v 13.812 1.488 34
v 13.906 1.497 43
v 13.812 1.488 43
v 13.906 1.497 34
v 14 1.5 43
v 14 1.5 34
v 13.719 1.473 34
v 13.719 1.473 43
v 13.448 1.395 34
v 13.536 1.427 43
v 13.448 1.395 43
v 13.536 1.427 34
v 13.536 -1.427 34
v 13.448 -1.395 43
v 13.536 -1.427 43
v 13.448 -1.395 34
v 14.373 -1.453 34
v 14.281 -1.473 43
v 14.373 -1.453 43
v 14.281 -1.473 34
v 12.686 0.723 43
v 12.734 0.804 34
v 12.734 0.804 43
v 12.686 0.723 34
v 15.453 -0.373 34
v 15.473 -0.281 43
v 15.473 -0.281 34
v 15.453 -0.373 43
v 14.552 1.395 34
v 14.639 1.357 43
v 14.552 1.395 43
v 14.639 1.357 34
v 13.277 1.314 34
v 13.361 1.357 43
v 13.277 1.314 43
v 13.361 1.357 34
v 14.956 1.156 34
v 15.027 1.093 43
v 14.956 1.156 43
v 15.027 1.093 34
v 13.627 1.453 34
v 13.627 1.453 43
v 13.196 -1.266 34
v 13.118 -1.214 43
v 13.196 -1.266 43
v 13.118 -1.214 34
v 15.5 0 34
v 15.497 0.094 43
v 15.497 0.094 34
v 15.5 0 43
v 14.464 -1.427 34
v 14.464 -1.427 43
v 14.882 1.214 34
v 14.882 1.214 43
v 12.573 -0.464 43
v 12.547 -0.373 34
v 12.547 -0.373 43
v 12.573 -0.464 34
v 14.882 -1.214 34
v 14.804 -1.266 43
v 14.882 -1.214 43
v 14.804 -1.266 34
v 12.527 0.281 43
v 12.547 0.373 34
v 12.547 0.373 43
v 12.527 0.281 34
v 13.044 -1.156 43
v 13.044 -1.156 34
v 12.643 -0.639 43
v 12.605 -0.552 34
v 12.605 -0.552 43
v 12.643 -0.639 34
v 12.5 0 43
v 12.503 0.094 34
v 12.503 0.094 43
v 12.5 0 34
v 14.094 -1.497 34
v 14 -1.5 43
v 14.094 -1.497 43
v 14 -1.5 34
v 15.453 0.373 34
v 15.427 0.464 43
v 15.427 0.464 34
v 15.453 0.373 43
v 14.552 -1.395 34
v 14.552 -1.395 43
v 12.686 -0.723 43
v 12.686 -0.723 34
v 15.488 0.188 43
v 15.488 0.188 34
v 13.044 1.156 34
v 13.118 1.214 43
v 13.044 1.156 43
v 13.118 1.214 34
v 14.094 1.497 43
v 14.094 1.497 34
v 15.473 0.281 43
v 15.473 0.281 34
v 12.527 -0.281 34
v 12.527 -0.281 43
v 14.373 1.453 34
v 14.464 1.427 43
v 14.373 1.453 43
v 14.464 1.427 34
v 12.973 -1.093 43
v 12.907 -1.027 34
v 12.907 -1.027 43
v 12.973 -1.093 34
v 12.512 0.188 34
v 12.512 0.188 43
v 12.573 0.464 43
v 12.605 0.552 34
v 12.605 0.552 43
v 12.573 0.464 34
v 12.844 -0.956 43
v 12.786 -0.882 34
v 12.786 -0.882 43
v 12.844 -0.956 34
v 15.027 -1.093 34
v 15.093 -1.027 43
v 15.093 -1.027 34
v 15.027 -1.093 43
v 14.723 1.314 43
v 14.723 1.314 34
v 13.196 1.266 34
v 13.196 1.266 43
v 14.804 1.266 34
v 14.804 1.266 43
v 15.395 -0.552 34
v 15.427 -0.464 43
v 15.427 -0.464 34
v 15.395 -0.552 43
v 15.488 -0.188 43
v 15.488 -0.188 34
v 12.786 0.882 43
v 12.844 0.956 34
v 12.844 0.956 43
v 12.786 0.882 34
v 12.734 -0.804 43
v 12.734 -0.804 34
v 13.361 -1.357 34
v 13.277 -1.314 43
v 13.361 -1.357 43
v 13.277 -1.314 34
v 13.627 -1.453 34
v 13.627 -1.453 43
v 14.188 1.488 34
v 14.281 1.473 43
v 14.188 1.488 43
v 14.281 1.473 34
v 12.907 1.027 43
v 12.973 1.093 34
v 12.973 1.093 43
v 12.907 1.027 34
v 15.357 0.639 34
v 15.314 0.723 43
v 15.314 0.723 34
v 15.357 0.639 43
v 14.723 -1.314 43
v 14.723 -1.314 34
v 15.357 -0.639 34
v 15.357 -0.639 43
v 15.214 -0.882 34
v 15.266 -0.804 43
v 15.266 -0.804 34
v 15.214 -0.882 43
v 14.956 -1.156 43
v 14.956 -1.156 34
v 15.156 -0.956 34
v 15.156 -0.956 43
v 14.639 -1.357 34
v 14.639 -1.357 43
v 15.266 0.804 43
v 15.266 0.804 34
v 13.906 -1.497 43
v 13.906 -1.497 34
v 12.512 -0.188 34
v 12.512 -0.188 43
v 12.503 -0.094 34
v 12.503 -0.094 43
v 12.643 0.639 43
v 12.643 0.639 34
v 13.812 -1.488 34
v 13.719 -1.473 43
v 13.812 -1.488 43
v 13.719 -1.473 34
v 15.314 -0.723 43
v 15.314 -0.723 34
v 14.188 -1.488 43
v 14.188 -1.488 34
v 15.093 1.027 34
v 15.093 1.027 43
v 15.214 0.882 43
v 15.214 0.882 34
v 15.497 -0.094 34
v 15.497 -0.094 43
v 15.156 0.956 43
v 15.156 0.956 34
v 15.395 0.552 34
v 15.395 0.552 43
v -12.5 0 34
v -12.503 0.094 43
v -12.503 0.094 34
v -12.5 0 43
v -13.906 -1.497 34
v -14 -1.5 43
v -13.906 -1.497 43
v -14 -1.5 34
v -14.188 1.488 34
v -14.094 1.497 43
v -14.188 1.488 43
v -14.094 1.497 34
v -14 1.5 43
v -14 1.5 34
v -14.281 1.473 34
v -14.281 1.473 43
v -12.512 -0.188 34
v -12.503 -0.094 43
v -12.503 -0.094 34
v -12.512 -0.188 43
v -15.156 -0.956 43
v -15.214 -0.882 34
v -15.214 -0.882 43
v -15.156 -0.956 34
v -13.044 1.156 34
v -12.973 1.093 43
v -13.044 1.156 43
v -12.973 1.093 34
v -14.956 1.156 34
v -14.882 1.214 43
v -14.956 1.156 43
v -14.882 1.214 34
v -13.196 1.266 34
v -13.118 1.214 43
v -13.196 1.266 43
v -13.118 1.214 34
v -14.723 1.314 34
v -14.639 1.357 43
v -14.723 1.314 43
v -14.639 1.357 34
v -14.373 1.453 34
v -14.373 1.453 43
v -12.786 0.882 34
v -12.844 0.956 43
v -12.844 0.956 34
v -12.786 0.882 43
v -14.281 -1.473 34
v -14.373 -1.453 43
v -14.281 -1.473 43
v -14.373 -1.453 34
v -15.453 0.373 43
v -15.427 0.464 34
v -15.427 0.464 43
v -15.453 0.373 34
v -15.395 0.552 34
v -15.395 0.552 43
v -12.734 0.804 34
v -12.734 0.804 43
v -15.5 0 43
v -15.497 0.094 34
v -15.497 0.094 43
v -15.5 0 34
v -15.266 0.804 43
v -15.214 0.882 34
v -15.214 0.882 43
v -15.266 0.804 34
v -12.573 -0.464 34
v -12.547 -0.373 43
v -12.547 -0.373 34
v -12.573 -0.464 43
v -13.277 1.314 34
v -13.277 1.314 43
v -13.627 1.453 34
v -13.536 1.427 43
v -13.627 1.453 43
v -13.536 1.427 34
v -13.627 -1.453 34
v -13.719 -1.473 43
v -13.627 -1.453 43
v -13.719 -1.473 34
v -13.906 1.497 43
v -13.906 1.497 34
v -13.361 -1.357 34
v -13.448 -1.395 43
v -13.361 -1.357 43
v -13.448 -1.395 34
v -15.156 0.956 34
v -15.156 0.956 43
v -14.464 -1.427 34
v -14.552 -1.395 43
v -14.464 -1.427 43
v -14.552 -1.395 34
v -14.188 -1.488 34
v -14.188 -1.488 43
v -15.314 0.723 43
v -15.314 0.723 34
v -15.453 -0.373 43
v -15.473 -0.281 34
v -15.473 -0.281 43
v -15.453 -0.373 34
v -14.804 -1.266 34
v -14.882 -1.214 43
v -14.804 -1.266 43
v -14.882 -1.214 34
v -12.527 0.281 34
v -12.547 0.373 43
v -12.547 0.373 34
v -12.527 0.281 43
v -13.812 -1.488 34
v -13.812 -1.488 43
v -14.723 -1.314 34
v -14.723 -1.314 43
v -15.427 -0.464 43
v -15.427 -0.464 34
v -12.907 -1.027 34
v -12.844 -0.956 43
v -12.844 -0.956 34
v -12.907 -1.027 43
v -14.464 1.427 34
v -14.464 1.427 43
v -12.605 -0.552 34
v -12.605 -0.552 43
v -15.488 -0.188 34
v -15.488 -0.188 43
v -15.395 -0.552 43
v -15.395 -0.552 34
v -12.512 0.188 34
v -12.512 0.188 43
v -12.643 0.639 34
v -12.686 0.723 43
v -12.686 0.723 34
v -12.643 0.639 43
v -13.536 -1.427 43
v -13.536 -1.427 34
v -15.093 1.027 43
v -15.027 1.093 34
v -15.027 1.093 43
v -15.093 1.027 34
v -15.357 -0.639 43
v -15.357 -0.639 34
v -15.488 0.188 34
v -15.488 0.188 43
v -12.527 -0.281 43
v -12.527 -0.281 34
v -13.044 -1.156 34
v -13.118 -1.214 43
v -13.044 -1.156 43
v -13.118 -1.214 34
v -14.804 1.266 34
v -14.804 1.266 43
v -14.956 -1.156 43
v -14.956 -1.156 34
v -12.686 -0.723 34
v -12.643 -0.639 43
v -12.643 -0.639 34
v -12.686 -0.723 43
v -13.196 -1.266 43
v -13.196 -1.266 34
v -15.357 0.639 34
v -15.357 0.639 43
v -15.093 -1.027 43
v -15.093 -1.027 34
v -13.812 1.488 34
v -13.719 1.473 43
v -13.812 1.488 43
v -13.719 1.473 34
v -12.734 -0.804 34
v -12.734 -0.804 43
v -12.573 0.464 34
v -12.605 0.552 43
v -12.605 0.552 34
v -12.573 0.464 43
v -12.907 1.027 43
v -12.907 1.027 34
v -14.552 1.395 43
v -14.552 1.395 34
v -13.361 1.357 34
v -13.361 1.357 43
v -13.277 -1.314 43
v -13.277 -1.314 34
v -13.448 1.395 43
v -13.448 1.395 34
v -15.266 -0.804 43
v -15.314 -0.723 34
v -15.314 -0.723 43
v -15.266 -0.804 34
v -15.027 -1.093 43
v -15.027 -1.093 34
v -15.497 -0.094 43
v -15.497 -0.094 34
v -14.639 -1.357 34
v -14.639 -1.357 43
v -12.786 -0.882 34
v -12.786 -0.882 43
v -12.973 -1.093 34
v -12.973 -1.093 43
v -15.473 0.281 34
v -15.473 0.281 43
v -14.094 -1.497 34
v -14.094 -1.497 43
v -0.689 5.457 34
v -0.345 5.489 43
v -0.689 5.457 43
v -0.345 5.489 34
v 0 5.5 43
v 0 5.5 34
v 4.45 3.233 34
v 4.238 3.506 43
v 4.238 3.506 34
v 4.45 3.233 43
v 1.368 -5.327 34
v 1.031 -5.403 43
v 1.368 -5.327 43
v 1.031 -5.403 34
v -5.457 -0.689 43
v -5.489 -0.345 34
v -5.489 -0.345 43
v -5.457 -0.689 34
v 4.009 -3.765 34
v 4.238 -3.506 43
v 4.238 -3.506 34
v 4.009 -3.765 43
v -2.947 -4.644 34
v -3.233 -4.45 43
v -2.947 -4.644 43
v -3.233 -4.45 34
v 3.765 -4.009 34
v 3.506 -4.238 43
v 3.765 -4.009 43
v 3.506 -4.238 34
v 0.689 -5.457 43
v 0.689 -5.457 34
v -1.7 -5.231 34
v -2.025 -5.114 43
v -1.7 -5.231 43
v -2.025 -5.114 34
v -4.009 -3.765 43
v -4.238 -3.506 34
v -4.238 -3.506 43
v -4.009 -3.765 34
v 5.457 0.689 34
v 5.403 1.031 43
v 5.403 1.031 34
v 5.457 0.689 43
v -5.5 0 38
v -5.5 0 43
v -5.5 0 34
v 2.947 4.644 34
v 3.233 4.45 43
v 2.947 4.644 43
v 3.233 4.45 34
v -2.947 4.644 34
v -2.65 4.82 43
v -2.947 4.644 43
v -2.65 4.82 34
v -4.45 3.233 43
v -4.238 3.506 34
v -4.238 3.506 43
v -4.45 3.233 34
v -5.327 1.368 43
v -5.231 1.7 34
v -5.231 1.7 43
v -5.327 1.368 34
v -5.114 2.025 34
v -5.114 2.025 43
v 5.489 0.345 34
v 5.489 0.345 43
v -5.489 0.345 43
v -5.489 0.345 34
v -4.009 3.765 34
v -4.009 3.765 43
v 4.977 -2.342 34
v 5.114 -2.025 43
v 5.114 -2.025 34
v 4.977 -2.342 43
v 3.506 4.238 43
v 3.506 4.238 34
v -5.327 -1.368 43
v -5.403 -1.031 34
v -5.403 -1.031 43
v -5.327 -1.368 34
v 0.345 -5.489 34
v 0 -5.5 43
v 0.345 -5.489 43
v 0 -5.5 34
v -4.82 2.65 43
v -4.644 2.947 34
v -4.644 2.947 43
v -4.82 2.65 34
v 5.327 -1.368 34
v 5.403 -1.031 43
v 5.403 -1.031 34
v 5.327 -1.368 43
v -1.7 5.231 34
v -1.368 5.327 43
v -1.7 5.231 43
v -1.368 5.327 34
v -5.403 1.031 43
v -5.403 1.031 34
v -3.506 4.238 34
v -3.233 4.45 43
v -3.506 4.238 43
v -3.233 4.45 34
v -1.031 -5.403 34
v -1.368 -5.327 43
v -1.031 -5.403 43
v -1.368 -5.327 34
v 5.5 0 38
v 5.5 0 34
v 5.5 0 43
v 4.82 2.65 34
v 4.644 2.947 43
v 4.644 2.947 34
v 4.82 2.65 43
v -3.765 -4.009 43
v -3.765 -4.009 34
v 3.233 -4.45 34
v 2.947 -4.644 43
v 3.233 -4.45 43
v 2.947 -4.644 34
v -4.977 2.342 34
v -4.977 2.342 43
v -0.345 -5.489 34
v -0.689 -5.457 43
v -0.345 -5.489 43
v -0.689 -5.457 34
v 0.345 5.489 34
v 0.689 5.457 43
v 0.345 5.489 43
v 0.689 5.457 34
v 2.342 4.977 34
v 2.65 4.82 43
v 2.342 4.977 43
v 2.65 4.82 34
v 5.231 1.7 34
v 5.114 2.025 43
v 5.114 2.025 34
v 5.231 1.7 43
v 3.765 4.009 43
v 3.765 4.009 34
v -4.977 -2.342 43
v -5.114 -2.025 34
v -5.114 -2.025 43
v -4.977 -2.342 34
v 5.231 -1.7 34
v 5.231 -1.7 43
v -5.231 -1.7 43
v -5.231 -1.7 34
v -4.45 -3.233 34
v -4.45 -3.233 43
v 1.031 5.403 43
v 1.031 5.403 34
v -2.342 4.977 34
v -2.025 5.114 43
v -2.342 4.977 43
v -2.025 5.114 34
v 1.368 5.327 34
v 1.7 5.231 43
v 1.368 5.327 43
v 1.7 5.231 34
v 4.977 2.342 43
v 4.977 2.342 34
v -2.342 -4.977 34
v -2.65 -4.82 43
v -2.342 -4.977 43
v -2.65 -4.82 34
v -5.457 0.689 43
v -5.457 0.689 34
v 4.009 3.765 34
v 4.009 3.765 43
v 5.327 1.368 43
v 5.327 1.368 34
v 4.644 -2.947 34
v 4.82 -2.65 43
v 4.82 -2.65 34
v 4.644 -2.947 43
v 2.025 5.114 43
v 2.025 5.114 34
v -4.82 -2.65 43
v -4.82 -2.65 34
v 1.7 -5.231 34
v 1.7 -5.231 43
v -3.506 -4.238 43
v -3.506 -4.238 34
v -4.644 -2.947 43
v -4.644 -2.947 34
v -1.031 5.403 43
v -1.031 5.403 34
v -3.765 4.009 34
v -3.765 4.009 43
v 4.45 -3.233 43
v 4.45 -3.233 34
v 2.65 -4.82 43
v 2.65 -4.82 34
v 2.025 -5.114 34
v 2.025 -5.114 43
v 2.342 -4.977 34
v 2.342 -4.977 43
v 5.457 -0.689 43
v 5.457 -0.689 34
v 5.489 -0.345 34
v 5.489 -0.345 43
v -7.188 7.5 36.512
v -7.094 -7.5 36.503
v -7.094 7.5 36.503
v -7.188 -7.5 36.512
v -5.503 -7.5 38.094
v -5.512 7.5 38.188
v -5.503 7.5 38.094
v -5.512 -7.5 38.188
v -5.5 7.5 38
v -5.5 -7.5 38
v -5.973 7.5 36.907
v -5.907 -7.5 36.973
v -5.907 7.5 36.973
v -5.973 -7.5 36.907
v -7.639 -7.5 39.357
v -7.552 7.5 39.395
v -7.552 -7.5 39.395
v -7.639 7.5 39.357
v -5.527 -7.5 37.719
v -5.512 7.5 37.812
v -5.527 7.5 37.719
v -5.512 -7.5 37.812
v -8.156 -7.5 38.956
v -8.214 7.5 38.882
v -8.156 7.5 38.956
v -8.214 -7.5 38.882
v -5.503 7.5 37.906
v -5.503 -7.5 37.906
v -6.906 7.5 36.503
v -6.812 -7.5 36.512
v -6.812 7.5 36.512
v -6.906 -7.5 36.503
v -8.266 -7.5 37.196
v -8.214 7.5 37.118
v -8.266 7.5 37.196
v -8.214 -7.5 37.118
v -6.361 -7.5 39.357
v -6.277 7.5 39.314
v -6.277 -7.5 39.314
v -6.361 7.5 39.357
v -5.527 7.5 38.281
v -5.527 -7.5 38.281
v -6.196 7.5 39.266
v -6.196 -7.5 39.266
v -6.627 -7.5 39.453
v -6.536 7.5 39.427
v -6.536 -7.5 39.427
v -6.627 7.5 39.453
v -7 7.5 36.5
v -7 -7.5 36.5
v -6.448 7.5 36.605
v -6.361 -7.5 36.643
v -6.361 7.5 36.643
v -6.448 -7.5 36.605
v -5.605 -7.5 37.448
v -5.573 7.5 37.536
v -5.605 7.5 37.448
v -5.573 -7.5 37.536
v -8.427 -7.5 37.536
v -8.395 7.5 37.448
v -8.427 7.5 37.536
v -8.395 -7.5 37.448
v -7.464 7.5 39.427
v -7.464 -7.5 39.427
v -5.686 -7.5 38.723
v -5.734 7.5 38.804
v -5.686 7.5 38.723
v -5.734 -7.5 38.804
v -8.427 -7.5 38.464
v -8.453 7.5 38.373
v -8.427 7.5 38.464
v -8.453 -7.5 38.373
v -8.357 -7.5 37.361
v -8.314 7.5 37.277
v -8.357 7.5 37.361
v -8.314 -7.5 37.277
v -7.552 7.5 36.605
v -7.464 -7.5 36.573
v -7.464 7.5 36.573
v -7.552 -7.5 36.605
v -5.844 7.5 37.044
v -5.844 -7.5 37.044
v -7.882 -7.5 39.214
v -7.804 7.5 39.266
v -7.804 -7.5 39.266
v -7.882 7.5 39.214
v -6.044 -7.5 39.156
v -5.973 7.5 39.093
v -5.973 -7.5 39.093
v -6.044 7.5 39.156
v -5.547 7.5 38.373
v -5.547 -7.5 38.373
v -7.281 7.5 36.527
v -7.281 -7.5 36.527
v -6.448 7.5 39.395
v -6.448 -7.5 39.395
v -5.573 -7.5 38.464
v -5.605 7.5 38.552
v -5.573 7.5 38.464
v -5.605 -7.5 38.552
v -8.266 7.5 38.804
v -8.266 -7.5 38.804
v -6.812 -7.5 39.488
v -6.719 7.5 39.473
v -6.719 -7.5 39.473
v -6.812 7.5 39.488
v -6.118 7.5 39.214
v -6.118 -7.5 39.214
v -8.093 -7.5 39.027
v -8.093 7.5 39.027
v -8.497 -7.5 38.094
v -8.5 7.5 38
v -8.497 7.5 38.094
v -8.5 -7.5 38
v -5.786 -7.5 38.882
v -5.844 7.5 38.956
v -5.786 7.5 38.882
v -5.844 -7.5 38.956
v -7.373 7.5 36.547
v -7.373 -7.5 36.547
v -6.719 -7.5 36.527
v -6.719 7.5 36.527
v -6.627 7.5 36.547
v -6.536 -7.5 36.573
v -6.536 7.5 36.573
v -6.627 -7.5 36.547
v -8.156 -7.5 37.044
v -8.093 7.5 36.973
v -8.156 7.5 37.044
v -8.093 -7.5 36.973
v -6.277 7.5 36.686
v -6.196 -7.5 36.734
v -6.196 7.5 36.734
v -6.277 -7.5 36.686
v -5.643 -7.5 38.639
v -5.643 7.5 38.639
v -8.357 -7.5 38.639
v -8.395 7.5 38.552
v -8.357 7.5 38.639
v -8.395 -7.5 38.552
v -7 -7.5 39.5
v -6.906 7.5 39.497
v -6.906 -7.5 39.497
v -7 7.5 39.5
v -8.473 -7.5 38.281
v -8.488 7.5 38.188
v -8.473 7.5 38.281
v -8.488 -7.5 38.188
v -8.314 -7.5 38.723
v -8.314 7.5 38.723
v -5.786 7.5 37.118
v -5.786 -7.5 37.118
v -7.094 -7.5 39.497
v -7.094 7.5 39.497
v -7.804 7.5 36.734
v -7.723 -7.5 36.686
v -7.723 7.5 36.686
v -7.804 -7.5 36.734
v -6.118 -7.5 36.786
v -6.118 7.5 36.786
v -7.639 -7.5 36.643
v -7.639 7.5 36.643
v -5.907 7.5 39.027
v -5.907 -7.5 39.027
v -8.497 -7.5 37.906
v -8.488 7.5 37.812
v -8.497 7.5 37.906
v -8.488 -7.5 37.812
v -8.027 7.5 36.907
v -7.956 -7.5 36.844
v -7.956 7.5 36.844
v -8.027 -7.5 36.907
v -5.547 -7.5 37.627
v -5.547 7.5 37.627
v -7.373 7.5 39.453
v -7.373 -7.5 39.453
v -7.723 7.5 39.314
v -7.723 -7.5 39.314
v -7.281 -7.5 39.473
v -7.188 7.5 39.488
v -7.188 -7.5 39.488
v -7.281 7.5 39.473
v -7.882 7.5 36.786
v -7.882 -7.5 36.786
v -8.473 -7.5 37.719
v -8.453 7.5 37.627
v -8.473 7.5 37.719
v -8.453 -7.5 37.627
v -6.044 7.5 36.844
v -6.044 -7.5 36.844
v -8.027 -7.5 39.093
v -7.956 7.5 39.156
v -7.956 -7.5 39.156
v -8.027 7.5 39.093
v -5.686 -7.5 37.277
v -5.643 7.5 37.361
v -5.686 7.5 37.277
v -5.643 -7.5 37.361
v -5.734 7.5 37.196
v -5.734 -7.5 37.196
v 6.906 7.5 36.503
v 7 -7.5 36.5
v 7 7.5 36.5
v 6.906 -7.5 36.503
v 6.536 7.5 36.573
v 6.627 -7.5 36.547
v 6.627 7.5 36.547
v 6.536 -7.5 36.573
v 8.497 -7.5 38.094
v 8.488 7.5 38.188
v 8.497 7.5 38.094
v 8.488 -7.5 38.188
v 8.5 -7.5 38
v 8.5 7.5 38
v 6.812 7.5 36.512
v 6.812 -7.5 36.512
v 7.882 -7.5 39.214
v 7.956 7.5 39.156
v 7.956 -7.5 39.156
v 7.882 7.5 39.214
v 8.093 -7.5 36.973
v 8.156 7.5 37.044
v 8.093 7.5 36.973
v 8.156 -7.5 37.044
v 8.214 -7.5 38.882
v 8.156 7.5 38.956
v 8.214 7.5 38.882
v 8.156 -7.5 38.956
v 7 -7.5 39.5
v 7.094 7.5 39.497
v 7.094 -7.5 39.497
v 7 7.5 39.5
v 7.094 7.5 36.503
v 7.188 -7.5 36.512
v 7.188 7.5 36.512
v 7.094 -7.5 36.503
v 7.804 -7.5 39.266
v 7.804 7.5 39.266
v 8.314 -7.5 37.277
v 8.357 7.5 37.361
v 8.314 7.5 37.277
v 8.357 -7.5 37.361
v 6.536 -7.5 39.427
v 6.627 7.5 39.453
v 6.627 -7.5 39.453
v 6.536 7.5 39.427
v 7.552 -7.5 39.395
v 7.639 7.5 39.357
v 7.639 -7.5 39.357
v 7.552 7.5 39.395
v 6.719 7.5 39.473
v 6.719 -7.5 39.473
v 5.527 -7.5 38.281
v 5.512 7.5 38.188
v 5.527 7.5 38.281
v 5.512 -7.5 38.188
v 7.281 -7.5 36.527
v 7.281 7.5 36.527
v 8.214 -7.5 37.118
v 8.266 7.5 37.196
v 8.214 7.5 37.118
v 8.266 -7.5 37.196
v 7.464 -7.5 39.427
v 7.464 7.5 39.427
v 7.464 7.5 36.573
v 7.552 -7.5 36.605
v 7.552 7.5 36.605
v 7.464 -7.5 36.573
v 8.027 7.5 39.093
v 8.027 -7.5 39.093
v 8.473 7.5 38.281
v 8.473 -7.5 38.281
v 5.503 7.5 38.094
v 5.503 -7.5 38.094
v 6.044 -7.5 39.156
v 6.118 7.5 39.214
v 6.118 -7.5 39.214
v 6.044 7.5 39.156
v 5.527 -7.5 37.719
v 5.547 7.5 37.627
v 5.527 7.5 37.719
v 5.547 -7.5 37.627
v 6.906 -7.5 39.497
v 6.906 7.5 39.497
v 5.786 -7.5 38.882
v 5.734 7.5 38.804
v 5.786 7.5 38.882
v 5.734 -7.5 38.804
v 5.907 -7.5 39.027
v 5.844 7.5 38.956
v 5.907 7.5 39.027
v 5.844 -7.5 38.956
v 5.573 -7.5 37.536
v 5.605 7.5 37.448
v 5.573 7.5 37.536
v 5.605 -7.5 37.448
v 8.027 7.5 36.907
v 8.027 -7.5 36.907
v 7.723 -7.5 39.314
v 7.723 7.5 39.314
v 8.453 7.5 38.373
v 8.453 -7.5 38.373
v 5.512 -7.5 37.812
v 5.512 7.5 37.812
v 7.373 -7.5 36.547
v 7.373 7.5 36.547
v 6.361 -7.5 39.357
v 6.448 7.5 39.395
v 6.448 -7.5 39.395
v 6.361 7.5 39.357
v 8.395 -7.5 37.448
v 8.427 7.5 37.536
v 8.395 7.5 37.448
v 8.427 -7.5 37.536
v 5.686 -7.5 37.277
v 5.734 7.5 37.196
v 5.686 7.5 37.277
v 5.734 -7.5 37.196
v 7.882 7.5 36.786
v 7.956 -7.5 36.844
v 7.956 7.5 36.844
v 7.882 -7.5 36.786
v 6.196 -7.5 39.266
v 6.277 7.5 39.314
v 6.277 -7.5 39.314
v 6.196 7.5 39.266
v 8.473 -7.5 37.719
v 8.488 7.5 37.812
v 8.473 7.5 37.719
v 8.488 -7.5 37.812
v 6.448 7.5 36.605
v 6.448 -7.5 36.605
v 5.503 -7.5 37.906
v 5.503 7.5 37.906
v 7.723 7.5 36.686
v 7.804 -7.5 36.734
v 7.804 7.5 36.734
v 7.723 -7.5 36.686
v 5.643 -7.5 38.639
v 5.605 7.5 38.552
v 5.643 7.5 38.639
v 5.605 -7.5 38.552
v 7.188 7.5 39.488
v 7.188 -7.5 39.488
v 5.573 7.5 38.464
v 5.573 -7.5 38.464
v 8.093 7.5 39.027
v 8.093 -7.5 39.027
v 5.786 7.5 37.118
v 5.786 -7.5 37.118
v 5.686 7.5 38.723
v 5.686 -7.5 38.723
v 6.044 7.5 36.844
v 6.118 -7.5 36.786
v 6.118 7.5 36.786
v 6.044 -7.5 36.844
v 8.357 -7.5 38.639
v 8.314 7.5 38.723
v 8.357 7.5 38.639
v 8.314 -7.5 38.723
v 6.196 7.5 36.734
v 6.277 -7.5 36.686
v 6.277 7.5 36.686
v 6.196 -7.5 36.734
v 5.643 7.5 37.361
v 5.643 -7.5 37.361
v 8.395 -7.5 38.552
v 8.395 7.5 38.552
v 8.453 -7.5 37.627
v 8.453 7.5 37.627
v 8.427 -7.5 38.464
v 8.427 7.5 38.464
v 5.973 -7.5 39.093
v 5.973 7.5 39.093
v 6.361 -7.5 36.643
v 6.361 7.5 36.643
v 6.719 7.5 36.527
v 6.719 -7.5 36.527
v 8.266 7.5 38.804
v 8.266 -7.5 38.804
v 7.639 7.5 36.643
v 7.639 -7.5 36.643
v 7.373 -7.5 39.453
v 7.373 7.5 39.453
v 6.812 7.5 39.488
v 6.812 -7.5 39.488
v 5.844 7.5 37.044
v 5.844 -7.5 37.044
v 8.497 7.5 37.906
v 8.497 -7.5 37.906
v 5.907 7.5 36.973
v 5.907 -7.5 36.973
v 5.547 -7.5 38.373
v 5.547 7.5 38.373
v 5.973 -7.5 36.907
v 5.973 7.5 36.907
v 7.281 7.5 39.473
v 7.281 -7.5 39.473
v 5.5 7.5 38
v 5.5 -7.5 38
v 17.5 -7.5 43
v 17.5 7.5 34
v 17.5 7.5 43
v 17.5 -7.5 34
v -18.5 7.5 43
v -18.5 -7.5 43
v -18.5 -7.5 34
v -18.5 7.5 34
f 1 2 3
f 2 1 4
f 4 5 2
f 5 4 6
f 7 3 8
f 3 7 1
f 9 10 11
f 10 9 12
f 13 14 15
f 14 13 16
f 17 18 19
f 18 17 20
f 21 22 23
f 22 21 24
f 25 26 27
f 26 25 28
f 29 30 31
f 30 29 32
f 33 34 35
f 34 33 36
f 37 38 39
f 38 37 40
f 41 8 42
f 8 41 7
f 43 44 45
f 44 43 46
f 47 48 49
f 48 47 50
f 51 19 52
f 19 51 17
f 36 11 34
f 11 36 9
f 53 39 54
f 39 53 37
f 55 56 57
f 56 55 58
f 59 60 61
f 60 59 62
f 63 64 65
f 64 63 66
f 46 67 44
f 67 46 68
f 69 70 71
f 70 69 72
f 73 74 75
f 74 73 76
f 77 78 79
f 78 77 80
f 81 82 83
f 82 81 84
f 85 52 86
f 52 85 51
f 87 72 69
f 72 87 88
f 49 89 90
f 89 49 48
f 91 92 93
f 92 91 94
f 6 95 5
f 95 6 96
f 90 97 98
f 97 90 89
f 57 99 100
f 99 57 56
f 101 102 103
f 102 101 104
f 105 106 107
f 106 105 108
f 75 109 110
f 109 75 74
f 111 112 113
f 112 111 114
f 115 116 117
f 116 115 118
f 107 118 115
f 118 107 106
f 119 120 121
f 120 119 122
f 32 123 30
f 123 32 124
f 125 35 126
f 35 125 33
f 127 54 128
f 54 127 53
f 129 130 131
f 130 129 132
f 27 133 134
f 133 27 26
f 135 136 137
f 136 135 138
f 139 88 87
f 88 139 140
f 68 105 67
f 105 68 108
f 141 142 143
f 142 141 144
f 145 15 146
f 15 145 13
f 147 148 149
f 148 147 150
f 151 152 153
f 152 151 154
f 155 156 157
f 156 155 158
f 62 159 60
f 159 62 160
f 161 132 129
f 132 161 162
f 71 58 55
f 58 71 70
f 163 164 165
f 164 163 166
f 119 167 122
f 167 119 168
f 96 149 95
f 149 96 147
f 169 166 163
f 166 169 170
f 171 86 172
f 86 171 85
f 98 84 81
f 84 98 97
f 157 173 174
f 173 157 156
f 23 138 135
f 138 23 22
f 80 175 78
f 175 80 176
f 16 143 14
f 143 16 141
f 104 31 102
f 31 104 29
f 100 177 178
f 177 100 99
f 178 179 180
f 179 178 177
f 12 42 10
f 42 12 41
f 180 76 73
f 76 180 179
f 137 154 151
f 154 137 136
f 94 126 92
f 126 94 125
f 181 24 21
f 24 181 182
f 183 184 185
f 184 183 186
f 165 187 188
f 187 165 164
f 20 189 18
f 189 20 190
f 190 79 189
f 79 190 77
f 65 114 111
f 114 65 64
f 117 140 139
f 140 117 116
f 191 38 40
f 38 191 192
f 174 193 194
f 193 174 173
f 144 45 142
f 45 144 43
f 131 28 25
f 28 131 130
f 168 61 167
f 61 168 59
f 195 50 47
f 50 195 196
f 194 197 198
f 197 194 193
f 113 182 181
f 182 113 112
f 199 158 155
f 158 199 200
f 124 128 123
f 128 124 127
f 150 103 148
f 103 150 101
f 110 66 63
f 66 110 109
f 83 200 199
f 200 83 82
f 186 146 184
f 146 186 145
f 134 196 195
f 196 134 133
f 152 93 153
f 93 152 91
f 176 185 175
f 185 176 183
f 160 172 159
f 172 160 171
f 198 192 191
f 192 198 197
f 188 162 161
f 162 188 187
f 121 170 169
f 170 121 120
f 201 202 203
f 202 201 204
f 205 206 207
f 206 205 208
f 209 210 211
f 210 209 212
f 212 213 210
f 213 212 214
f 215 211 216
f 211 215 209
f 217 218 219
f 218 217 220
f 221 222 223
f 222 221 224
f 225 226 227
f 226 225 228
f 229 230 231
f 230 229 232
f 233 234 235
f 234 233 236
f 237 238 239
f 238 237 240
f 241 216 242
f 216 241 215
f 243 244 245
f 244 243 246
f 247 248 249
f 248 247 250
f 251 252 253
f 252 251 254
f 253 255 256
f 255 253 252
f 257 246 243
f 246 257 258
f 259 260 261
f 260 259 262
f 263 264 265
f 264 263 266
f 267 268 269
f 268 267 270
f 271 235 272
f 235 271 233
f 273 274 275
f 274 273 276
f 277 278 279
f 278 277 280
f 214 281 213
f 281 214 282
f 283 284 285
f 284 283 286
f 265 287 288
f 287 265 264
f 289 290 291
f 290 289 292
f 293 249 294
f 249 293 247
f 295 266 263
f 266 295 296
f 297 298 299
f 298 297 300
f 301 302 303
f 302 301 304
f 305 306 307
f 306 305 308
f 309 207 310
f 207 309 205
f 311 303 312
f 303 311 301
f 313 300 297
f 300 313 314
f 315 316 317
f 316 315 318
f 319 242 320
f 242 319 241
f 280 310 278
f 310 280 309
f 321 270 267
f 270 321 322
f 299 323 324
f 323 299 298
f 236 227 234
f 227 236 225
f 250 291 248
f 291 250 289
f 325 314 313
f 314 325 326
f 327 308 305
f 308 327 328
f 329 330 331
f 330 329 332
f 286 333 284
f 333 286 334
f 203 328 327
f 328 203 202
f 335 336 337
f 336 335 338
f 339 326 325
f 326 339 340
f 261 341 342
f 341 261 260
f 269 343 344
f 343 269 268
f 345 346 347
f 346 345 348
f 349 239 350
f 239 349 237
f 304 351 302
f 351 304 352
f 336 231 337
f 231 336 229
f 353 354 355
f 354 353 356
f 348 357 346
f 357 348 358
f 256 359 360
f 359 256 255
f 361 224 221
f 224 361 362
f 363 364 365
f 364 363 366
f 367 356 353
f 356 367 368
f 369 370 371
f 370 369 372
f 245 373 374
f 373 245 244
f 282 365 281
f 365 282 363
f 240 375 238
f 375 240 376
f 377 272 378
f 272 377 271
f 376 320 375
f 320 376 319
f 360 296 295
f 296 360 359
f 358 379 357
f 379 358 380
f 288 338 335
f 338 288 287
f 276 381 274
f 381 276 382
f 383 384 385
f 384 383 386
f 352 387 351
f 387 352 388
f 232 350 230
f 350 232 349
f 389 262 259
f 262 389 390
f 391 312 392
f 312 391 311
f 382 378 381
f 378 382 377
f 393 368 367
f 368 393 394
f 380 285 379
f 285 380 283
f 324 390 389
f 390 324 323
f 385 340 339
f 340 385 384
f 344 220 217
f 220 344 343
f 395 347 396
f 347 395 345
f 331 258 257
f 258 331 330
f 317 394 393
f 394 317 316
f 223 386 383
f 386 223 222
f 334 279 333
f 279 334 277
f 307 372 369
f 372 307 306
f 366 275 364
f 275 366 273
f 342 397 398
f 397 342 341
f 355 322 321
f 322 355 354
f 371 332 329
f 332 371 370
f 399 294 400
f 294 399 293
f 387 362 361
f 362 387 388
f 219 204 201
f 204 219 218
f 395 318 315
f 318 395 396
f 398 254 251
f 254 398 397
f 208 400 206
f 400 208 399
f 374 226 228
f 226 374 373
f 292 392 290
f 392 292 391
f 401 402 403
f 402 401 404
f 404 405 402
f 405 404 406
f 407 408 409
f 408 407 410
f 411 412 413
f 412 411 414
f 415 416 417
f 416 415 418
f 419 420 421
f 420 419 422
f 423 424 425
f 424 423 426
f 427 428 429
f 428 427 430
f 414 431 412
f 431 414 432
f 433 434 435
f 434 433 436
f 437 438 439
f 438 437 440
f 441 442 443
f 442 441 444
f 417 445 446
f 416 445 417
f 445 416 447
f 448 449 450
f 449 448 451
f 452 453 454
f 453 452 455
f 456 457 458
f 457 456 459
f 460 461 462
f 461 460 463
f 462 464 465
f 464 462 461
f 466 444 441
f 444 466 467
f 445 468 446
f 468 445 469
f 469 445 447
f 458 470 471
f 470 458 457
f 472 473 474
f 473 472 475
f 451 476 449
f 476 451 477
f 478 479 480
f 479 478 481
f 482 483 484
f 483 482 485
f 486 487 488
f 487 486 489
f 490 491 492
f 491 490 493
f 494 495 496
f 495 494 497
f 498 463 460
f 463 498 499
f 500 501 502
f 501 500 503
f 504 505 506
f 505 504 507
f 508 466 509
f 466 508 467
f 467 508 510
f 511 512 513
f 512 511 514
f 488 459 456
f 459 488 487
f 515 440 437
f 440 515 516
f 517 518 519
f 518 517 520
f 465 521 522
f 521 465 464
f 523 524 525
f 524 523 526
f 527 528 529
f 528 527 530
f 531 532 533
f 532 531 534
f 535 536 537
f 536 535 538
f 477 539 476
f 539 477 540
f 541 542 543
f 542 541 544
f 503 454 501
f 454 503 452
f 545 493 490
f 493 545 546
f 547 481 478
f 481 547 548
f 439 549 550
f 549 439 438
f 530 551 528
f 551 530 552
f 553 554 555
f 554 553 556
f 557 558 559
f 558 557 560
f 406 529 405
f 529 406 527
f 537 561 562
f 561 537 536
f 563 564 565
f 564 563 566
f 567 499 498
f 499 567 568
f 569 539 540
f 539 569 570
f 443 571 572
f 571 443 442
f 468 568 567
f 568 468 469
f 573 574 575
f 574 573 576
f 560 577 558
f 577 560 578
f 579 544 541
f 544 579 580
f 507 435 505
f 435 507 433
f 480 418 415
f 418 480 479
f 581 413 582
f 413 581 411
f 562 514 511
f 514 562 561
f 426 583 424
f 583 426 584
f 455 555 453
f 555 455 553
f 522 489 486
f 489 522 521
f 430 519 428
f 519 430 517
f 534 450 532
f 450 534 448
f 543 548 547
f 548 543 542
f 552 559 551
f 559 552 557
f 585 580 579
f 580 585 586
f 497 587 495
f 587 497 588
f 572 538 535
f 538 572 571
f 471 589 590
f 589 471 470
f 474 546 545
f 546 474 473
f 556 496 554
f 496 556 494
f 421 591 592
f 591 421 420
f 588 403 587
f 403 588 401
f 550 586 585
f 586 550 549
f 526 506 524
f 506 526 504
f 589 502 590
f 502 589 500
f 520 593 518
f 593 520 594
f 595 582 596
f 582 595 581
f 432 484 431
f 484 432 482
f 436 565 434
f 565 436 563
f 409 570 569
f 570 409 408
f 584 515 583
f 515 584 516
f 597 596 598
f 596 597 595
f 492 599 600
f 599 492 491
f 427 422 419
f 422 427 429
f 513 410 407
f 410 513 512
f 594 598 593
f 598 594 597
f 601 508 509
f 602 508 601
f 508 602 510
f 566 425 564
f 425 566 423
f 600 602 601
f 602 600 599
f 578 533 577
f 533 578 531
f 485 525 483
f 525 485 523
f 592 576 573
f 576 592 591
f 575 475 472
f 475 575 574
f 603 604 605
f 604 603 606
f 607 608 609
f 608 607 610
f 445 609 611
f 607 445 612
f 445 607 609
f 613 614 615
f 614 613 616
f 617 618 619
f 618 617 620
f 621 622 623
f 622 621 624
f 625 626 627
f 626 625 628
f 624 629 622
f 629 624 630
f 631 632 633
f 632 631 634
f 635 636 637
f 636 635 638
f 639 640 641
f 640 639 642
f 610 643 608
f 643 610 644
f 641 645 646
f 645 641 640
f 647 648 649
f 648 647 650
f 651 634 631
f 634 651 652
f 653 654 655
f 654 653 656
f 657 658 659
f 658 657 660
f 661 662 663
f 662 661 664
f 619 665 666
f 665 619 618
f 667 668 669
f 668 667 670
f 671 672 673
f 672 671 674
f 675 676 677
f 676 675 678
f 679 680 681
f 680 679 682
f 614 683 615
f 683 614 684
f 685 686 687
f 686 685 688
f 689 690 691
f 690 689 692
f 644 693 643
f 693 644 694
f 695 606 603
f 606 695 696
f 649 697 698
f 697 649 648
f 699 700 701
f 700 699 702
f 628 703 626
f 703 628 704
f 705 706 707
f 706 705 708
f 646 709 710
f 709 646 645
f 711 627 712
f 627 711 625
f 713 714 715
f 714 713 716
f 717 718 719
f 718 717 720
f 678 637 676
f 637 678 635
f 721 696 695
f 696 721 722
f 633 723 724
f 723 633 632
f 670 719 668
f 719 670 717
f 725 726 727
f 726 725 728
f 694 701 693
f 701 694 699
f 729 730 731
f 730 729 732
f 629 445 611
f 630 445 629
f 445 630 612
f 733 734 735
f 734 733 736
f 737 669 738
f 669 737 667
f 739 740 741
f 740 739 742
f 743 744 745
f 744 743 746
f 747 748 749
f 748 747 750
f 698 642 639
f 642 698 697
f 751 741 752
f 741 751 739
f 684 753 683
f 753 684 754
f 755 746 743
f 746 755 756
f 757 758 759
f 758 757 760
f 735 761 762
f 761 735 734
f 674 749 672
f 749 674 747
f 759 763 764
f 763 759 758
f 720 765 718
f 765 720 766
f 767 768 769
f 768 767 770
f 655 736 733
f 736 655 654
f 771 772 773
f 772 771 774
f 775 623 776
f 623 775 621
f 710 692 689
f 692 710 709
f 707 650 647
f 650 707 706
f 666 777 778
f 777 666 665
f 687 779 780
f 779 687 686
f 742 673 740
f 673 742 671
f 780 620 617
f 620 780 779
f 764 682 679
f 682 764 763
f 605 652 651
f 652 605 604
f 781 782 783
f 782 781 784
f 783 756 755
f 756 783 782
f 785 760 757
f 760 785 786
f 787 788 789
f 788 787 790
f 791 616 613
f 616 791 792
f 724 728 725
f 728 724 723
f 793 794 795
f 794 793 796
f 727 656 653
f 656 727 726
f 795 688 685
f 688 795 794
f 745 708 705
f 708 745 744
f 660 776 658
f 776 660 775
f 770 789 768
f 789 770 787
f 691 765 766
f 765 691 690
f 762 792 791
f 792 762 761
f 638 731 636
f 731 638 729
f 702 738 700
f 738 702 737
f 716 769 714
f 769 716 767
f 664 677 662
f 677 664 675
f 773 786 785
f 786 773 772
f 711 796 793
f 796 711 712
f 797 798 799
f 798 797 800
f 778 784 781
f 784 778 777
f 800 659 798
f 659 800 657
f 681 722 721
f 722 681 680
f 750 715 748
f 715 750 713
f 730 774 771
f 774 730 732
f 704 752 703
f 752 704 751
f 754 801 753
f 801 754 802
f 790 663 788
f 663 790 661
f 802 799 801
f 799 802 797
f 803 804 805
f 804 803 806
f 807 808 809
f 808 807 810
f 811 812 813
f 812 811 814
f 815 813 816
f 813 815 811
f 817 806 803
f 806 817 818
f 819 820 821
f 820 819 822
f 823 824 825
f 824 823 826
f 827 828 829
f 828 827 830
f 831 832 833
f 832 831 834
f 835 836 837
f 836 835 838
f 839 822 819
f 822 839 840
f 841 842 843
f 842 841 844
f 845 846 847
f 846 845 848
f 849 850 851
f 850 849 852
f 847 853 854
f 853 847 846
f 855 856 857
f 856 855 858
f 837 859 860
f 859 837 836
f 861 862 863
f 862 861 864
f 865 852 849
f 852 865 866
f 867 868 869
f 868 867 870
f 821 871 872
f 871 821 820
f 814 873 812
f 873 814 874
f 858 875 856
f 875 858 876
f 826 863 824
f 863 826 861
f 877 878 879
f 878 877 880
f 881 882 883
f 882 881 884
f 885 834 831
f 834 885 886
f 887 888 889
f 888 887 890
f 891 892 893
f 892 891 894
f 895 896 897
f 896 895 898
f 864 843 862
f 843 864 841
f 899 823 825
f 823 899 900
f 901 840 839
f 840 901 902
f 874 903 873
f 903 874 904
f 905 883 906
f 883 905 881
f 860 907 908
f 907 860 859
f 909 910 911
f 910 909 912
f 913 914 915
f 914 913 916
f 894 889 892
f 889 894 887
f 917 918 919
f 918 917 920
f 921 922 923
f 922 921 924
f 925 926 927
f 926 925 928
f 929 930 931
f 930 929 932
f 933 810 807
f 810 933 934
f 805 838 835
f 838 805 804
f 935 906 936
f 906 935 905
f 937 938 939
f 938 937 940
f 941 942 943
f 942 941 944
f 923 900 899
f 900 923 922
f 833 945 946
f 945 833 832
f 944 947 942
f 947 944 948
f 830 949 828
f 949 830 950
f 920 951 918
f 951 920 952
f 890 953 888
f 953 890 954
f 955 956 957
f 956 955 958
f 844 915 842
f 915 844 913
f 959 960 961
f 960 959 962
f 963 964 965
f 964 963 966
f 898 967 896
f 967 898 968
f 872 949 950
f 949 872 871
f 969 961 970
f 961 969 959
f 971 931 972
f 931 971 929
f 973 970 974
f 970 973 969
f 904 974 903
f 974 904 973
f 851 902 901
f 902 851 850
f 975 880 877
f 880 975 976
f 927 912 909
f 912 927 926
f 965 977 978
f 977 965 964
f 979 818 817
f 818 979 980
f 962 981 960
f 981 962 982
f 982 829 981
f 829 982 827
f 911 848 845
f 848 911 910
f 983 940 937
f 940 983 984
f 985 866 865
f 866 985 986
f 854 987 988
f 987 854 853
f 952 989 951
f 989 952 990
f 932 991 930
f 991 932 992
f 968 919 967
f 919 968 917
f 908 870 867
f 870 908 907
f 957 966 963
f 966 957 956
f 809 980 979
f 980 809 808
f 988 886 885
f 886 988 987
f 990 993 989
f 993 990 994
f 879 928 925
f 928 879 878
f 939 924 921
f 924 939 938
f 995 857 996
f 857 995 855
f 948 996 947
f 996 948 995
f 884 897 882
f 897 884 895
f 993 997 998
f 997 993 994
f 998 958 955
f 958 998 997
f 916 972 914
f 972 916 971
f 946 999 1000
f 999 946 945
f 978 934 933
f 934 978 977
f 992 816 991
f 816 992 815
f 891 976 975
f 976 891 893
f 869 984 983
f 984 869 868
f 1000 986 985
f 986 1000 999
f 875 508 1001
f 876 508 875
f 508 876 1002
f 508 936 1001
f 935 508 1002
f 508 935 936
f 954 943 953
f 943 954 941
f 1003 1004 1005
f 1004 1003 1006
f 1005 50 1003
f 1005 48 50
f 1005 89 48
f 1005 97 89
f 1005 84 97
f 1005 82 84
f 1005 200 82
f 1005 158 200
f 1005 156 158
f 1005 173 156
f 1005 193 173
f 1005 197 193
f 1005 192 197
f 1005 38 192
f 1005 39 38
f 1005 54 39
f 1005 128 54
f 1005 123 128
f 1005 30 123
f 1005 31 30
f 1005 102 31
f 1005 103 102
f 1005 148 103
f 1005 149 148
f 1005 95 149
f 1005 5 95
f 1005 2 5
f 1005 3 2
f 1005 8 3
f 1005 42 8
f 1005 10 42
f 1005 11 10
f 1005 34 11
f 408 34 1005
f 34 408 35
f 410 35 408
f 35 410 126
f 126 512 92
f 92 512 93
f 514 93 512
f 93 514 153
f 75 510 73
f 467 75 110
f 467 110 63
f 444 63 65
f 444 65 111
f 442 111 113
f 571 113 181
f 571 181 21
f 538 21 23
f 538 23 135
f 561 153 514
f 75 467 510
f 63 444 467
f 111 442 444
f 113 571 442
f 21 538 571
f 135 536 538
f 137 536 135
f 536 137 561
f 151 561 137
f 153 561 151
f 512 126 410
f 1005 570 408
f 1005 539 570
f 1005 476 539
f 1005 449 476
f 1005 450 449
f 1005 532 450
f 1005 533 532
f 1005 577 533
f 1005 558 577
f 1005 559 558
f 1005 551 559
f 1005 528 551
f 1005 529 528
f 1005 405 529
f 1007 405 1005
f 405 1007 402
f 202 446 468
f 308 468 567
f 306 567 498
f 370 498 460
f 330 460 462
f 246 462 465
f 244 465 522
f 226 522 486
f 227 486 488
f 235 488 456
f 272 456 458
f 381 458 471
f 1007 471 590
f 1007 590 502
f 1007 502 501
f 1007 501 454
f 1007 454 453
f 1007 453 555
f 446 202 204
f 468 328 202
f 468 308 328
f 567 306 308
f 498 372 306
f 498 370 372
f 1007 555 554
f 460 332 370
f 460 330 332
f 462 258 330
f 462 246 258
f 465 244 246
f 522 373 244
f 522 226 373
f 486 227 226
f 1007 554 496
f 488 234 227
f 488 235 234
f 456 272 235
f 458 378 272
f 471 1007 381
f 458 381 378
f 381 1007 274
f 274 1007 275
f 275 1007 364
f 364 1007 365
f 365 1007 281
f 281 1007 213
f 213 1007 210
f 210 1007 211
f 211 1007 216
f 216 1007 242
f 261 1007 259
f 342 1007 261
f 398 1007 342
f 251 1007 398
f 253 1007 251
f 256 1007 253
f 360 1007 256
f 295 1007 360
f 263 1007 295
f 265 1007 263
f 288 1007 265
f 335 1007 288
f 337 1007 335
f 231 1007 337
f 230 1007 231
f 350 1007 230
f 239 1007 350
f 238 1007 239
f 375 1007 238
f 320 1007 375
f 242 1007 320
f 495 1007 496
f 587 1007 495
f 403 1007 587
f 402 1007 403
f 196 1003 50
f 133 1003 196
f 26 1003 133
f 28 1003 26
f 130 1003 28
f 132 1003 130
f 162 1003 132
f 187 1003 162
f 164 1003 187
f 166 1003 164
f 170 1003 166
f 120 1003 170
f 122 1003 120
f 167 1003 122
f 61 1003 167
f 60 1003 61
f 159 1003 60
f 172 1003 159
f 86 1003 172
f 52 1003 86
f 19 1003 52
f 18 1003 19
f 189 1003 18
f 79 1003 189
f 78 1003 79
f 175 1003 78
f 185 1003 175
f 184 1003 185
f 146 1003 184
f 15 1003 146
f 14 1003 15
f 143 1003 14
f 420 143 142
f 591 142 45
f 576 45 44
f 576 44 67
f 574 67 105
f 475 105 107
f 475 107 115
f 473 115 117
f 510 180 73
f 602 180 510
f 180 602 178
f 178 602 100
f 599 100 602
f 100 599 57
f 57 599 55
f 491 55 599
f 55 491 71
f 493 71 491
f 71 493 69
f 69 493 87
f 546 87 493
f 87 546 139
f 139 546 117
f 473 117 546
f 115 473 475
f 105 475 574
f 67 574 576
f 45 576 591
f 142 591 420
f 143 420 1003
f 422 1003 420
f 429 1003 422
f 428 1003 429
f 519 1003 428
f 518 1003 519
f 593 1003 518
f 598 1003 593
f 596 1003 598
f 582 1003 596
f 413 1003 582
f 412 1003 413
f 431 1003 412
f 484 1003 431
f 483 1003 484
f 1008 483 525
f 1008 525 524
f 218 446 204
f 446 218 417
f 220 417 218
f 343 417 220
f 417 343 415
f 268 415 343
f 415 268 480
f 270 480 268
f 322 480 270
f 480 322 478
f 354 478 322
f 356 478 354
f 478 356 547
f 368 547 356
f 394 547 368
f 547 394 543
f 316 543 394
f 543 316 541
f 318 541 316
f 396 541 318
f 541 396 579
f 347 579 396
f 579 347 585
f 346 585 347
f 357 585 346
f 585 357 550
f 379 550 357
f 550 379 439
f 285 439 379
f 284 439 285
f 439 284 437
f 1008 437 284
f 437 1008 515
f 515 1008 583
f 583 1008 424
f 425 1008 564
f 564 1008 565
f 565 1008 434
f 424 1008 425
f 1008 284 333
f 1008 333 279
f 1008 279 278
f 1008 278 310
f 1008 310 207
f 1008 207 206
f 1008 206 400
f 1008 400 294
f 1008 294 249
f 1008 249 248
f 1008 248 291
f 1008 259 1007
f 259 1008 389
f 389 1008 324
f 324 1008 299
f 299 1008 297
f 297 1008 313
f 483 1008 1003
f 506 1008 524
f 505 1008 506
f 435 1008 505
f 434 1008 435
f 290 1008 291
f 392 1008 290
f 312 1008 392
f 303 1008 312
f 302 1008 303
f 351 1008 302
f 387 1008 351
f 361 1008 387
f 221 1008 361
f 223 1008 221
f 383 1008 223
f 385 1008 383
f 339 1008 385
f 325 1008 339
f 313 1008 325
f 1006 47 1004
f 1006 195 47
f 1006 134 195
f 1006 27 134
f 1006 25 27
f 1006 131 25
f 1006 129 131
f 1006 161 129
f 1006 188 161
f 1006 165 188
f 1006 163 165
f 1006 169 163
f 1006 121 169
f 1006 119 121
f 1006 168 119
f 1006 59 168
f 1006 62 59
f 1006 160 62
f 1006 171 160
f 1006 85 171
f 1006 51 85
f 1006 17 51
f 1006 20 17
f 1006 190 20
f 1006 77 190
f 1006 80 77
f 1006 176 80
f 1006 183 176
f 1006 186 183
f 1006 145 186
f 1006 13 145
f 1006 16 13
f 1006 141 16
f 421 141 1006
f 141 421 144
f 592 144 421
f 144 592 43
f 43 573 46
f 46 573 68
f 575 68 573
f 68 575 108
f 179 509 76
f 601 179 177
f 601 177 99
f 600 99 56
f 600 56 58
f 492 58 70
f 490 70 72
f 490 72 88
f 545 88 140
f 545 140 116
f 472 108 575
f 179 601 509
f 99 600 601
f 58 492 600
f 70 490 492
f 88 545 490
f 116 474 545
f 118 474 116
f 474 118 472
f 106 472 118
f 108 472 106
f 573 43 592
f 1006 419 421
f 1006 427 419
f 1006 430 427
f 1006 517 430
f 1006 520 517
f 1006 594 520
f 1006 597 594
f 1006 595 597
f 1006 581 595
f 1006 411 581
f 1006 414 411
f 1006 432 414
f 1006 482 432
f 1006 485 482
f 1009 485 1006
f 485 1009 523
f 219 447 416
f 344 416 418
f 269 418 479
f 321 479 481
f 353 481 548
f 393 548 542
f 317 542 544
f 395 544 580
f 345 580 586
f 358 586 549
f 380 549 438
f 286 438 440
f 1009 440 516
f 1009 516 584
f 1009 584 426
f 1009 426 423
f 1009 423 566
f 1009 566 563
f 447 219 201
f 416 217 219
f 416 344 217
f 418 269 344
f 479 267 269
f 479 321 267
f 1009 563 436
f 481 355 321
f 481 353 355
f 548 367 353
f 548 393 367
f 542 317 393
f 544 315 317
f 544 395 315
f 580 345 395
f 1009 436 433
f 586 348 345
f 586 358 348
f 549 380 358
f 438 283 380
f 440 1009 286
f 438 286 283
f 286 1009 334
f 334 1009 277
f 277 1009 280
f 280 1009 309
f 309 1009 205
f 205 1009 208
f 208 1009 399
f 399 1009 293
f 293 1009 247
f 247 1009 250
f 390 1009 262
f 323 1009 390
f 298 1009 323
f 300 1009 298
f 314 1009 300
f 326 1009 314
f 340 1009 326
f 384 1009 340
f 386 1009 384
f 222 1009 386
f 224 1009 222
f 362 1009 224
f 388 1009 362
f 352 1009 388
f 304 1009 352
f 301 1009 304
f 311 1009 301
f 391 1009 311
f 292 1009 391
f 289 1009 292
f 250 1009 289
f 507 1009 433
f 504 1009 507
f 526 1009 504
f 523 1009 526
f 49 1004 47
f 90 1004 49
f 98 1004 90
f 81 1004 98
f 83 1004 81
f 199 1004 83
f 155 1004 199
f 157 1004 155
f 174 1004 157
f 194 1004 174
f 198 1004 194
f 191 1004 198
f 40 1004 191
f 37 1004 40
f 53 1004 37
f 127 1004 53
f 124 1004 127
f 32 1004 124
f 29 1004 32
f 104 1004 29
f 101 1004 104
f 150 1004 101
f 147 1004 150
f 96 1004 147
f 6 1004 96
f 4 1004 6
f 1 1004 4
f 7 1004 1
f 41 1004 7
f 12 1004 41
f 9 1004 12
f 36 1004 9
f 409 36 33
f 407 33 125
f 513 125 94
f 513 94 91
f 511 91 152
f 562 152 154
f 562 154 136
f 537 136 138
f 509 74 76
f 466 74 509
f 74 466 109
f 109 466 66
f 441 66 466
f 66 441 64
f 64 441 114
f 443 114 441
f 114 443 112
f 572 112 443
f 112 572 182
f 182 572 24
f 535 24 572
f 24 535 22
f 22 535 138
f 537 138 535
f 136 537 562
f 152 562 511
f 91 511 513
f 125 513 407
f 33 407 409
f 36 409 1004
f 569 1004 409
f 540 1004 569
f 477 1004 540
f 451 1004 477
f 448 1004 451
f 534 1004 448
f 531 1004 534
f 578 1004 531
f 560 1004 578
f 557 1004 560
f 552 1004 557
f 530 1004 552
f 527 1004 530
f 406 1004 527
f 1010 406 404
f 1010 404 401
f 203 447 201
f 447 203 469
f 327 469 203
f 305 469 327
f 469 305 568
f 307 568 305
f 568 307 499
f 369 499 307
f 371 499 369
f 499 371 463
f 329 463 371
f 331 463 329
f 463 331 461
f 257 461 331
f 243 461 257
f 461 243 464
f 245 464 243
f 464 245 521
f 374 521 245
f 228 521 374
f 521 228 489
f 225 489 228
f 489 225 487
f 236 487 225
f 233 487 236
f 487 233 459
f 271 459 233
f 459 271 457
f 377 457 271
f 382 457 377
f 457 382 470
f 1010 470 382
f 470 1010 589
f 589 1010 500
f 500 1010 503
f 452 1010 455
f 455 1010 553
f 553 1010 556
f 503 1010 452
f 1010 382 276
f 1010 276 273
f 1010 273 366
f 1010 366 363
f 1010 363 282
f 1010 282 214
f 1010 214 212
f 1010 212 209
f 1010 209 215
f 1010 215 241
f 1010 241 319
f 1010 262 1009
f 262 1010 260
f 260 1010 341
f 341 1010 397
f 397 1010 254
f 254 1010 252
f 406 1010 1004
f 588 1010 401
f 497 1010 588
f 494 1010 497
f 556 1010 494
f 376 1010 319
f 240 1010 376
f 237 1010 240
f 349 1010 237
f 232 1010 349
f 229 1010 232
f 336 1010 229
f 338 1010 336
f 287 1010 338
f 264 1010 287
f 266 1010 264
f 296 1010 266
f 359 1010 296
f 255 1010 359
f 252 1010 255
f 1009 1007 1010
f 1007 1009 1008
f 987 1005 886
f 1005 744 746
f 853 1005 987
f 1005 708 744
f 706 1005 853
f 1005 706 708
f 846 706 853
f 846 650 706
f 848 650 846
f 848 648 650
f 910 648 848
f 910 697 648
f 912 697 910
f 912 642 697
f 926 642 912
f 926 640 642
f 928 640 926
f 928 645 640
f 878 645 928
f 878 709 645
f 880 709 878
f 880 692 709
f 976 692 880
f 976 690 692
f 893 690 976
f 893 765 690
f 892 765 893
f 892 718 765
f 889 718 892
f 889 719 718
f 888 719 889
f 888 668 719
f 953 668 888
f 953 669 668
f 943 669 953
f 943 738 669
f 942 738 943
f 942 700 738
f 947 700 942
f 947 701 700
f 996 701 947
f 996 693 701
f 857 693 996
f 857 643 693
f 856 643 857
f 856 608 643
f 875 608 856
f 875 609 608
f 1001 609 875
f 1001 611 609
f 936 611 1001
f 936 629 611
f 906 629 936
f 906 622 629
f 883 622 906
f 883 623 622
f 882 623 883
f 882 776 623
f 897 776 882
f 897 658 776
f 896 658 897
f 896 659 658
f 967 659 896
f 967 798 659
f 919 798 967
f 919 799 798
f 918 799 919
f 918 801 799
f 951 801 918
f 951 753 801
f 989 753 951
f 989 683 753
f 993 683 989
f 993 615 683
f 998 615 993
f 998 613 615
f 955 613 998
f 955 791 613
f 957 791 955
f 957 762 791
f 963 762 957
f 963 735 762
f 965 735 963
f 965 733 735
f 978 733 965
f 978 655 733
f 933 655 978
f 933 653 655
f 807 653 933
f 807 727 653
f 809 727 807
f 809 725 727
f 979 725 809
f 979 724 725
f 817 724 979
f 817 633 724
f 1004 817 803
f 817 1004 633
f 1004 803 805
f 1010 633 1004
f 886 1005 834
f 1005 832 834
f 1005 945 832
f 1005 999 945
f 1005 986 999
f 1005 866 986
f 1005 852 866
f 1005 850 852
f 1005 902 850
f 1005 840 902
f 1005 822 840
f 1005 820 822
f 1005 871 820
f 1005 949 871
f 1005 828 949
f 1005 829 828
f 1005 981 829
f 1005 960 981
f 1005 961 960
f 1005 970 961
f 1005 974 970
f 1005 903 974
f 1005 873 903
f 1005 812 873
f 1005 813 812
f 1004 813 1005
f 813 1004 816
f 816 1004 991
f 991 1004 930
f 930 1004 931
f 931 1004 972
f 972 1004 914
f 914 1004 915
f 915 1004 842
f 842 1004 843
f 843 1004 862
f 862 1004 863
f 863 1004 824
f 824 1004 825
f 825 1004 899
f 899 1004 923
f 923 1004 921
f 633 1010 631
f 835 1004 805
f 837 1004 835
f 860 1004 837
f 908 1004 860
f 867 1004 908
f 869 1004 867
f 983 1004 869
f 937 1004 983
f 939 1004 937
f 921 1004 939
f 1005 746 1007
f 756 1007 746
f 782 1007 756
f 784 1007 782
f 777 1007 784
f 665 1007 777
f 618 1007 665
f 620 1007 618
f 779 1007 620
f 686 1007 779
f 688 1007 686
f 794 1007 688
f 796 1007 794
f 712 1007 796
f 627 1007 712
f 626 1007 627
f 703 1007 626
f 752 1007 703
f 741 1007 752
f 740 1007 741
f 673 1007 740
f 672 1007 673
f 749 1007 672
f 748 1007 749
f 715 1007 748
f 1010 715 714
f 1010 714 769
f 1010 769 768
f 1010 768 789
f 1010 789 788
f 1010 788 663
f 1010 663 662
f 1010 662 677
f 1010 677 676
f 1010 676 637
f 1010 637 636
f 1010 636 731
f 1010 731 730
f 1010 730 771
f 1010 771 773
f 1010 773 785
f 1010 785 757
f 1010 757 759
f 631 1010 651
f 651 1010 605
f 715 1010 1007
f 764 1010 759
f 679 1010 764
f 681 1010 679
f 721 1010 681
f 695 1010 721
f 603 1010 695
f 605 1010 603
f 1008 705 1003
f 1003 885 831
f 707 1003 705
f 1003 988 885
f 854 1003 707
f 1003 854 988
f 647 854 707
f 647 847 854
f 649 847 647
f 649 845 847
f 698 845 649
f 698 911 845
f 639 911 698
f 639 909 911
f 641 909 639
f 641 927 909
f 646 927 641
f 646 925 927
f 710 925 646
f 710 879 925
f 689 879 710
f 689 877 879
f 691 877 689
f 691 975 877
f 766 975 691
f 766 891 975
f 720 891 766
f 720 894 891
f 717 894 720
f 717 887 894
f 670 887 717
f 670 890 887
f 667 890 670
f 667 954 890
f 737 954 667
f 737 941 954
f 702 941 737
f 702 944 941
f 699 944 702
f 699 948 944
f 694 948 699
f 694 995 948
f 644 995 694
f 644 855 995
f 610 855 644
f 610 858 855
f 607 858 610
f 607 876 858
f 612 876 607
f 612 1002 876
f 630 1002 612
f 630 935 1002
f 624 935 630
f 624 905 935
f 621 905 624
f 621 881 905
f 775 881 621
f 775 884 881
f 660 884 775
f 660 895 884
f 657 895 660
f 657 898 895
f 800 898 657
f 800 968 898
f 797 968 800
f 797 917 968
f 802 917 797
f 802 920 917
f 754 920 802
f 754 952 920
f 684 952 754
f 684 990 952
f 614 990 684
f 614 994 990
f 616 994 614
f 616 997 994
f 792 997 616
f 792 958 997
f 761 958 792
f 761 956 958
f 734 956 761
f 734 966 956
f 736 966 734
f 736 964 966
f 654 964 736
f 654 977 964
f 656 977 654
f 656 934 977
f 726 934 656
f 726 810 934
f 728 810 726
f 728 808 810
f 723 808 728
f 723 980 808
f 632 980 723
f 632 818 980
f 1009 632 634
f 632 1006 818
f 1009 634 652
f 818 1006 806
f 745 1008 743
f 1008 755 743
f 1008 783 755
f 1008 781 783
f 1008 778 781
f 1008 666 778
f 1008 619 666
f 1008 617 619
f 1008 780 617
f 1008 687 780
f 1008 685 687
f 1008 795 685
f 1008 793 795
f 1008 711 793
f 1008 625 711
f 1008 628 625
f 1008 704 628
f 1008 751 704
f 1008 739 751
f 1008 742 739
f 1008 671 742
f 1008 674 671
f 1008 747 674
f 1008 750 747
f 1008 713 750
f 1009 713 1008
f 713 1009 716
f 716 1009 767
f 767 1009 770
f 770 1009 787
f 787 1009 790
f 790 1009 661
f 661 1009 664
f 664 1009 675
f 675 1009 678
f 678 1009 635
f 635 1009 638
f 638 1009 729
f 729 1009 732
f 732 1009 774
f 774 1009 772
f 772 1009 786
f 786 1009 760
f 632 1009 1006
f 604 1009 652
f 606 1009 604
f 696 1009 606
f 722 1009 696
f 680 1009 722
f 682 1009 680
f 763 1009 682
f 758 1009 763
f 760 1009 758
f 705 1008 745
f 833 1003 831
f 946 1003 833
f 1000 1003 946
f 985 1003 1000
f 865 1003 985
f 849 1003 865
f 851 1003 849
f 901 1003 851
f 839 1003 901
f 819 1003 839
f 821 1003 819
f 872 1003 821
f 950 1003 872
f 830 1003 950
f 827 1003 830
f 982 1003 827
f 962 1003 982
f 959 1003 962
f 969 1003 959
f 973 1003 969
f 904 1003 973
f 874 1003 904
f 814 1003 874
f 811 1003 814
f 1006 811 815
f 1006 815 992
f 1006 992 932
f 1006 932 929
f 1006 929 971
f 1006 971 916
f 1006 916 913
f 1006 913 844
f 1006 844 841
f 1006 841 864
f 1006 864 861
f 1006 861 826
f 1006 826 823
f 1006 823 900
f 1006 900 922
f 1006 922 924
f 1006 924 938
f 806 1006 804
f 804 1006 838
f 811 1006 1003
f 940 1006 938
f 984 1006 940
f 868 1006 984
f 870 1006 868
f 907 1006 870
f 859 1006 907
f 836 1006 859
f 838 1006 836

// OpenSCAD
difference(){
	union(){
        

        translate([-9.5-9,-7.5,34]){
            cube([15+9+18-6,15,9], center=false);
        }


	}
	union() {
        translate([20-6,0,14]){
            rotate([0,0,90]){
                cylinder(h=30, r=1.5, $fn=100, center=false);
            }
        }
        translate([-14,0,14]){
            rotate([0,0,90]){
                cylinder(h=30, r=1.5, $fn=100, center=false);
            }
        }


        translate([0,0,-35]){
            rotate([0,0,90]){
                cylinder(h=100, r=5.5, $fn=100, center=false);
            }
        }
        translate([-7,20,38]){
            rotate([90,0,0]){
                cylinder(h=100, r=1.5, $fn=100, center=false);
            }
        }
        translate([7,20,38]){
            rotate([90,0,0]){
                cylinder(h=100, r=1.5, $fn=100, center=false);
            }
        }

	}
}
